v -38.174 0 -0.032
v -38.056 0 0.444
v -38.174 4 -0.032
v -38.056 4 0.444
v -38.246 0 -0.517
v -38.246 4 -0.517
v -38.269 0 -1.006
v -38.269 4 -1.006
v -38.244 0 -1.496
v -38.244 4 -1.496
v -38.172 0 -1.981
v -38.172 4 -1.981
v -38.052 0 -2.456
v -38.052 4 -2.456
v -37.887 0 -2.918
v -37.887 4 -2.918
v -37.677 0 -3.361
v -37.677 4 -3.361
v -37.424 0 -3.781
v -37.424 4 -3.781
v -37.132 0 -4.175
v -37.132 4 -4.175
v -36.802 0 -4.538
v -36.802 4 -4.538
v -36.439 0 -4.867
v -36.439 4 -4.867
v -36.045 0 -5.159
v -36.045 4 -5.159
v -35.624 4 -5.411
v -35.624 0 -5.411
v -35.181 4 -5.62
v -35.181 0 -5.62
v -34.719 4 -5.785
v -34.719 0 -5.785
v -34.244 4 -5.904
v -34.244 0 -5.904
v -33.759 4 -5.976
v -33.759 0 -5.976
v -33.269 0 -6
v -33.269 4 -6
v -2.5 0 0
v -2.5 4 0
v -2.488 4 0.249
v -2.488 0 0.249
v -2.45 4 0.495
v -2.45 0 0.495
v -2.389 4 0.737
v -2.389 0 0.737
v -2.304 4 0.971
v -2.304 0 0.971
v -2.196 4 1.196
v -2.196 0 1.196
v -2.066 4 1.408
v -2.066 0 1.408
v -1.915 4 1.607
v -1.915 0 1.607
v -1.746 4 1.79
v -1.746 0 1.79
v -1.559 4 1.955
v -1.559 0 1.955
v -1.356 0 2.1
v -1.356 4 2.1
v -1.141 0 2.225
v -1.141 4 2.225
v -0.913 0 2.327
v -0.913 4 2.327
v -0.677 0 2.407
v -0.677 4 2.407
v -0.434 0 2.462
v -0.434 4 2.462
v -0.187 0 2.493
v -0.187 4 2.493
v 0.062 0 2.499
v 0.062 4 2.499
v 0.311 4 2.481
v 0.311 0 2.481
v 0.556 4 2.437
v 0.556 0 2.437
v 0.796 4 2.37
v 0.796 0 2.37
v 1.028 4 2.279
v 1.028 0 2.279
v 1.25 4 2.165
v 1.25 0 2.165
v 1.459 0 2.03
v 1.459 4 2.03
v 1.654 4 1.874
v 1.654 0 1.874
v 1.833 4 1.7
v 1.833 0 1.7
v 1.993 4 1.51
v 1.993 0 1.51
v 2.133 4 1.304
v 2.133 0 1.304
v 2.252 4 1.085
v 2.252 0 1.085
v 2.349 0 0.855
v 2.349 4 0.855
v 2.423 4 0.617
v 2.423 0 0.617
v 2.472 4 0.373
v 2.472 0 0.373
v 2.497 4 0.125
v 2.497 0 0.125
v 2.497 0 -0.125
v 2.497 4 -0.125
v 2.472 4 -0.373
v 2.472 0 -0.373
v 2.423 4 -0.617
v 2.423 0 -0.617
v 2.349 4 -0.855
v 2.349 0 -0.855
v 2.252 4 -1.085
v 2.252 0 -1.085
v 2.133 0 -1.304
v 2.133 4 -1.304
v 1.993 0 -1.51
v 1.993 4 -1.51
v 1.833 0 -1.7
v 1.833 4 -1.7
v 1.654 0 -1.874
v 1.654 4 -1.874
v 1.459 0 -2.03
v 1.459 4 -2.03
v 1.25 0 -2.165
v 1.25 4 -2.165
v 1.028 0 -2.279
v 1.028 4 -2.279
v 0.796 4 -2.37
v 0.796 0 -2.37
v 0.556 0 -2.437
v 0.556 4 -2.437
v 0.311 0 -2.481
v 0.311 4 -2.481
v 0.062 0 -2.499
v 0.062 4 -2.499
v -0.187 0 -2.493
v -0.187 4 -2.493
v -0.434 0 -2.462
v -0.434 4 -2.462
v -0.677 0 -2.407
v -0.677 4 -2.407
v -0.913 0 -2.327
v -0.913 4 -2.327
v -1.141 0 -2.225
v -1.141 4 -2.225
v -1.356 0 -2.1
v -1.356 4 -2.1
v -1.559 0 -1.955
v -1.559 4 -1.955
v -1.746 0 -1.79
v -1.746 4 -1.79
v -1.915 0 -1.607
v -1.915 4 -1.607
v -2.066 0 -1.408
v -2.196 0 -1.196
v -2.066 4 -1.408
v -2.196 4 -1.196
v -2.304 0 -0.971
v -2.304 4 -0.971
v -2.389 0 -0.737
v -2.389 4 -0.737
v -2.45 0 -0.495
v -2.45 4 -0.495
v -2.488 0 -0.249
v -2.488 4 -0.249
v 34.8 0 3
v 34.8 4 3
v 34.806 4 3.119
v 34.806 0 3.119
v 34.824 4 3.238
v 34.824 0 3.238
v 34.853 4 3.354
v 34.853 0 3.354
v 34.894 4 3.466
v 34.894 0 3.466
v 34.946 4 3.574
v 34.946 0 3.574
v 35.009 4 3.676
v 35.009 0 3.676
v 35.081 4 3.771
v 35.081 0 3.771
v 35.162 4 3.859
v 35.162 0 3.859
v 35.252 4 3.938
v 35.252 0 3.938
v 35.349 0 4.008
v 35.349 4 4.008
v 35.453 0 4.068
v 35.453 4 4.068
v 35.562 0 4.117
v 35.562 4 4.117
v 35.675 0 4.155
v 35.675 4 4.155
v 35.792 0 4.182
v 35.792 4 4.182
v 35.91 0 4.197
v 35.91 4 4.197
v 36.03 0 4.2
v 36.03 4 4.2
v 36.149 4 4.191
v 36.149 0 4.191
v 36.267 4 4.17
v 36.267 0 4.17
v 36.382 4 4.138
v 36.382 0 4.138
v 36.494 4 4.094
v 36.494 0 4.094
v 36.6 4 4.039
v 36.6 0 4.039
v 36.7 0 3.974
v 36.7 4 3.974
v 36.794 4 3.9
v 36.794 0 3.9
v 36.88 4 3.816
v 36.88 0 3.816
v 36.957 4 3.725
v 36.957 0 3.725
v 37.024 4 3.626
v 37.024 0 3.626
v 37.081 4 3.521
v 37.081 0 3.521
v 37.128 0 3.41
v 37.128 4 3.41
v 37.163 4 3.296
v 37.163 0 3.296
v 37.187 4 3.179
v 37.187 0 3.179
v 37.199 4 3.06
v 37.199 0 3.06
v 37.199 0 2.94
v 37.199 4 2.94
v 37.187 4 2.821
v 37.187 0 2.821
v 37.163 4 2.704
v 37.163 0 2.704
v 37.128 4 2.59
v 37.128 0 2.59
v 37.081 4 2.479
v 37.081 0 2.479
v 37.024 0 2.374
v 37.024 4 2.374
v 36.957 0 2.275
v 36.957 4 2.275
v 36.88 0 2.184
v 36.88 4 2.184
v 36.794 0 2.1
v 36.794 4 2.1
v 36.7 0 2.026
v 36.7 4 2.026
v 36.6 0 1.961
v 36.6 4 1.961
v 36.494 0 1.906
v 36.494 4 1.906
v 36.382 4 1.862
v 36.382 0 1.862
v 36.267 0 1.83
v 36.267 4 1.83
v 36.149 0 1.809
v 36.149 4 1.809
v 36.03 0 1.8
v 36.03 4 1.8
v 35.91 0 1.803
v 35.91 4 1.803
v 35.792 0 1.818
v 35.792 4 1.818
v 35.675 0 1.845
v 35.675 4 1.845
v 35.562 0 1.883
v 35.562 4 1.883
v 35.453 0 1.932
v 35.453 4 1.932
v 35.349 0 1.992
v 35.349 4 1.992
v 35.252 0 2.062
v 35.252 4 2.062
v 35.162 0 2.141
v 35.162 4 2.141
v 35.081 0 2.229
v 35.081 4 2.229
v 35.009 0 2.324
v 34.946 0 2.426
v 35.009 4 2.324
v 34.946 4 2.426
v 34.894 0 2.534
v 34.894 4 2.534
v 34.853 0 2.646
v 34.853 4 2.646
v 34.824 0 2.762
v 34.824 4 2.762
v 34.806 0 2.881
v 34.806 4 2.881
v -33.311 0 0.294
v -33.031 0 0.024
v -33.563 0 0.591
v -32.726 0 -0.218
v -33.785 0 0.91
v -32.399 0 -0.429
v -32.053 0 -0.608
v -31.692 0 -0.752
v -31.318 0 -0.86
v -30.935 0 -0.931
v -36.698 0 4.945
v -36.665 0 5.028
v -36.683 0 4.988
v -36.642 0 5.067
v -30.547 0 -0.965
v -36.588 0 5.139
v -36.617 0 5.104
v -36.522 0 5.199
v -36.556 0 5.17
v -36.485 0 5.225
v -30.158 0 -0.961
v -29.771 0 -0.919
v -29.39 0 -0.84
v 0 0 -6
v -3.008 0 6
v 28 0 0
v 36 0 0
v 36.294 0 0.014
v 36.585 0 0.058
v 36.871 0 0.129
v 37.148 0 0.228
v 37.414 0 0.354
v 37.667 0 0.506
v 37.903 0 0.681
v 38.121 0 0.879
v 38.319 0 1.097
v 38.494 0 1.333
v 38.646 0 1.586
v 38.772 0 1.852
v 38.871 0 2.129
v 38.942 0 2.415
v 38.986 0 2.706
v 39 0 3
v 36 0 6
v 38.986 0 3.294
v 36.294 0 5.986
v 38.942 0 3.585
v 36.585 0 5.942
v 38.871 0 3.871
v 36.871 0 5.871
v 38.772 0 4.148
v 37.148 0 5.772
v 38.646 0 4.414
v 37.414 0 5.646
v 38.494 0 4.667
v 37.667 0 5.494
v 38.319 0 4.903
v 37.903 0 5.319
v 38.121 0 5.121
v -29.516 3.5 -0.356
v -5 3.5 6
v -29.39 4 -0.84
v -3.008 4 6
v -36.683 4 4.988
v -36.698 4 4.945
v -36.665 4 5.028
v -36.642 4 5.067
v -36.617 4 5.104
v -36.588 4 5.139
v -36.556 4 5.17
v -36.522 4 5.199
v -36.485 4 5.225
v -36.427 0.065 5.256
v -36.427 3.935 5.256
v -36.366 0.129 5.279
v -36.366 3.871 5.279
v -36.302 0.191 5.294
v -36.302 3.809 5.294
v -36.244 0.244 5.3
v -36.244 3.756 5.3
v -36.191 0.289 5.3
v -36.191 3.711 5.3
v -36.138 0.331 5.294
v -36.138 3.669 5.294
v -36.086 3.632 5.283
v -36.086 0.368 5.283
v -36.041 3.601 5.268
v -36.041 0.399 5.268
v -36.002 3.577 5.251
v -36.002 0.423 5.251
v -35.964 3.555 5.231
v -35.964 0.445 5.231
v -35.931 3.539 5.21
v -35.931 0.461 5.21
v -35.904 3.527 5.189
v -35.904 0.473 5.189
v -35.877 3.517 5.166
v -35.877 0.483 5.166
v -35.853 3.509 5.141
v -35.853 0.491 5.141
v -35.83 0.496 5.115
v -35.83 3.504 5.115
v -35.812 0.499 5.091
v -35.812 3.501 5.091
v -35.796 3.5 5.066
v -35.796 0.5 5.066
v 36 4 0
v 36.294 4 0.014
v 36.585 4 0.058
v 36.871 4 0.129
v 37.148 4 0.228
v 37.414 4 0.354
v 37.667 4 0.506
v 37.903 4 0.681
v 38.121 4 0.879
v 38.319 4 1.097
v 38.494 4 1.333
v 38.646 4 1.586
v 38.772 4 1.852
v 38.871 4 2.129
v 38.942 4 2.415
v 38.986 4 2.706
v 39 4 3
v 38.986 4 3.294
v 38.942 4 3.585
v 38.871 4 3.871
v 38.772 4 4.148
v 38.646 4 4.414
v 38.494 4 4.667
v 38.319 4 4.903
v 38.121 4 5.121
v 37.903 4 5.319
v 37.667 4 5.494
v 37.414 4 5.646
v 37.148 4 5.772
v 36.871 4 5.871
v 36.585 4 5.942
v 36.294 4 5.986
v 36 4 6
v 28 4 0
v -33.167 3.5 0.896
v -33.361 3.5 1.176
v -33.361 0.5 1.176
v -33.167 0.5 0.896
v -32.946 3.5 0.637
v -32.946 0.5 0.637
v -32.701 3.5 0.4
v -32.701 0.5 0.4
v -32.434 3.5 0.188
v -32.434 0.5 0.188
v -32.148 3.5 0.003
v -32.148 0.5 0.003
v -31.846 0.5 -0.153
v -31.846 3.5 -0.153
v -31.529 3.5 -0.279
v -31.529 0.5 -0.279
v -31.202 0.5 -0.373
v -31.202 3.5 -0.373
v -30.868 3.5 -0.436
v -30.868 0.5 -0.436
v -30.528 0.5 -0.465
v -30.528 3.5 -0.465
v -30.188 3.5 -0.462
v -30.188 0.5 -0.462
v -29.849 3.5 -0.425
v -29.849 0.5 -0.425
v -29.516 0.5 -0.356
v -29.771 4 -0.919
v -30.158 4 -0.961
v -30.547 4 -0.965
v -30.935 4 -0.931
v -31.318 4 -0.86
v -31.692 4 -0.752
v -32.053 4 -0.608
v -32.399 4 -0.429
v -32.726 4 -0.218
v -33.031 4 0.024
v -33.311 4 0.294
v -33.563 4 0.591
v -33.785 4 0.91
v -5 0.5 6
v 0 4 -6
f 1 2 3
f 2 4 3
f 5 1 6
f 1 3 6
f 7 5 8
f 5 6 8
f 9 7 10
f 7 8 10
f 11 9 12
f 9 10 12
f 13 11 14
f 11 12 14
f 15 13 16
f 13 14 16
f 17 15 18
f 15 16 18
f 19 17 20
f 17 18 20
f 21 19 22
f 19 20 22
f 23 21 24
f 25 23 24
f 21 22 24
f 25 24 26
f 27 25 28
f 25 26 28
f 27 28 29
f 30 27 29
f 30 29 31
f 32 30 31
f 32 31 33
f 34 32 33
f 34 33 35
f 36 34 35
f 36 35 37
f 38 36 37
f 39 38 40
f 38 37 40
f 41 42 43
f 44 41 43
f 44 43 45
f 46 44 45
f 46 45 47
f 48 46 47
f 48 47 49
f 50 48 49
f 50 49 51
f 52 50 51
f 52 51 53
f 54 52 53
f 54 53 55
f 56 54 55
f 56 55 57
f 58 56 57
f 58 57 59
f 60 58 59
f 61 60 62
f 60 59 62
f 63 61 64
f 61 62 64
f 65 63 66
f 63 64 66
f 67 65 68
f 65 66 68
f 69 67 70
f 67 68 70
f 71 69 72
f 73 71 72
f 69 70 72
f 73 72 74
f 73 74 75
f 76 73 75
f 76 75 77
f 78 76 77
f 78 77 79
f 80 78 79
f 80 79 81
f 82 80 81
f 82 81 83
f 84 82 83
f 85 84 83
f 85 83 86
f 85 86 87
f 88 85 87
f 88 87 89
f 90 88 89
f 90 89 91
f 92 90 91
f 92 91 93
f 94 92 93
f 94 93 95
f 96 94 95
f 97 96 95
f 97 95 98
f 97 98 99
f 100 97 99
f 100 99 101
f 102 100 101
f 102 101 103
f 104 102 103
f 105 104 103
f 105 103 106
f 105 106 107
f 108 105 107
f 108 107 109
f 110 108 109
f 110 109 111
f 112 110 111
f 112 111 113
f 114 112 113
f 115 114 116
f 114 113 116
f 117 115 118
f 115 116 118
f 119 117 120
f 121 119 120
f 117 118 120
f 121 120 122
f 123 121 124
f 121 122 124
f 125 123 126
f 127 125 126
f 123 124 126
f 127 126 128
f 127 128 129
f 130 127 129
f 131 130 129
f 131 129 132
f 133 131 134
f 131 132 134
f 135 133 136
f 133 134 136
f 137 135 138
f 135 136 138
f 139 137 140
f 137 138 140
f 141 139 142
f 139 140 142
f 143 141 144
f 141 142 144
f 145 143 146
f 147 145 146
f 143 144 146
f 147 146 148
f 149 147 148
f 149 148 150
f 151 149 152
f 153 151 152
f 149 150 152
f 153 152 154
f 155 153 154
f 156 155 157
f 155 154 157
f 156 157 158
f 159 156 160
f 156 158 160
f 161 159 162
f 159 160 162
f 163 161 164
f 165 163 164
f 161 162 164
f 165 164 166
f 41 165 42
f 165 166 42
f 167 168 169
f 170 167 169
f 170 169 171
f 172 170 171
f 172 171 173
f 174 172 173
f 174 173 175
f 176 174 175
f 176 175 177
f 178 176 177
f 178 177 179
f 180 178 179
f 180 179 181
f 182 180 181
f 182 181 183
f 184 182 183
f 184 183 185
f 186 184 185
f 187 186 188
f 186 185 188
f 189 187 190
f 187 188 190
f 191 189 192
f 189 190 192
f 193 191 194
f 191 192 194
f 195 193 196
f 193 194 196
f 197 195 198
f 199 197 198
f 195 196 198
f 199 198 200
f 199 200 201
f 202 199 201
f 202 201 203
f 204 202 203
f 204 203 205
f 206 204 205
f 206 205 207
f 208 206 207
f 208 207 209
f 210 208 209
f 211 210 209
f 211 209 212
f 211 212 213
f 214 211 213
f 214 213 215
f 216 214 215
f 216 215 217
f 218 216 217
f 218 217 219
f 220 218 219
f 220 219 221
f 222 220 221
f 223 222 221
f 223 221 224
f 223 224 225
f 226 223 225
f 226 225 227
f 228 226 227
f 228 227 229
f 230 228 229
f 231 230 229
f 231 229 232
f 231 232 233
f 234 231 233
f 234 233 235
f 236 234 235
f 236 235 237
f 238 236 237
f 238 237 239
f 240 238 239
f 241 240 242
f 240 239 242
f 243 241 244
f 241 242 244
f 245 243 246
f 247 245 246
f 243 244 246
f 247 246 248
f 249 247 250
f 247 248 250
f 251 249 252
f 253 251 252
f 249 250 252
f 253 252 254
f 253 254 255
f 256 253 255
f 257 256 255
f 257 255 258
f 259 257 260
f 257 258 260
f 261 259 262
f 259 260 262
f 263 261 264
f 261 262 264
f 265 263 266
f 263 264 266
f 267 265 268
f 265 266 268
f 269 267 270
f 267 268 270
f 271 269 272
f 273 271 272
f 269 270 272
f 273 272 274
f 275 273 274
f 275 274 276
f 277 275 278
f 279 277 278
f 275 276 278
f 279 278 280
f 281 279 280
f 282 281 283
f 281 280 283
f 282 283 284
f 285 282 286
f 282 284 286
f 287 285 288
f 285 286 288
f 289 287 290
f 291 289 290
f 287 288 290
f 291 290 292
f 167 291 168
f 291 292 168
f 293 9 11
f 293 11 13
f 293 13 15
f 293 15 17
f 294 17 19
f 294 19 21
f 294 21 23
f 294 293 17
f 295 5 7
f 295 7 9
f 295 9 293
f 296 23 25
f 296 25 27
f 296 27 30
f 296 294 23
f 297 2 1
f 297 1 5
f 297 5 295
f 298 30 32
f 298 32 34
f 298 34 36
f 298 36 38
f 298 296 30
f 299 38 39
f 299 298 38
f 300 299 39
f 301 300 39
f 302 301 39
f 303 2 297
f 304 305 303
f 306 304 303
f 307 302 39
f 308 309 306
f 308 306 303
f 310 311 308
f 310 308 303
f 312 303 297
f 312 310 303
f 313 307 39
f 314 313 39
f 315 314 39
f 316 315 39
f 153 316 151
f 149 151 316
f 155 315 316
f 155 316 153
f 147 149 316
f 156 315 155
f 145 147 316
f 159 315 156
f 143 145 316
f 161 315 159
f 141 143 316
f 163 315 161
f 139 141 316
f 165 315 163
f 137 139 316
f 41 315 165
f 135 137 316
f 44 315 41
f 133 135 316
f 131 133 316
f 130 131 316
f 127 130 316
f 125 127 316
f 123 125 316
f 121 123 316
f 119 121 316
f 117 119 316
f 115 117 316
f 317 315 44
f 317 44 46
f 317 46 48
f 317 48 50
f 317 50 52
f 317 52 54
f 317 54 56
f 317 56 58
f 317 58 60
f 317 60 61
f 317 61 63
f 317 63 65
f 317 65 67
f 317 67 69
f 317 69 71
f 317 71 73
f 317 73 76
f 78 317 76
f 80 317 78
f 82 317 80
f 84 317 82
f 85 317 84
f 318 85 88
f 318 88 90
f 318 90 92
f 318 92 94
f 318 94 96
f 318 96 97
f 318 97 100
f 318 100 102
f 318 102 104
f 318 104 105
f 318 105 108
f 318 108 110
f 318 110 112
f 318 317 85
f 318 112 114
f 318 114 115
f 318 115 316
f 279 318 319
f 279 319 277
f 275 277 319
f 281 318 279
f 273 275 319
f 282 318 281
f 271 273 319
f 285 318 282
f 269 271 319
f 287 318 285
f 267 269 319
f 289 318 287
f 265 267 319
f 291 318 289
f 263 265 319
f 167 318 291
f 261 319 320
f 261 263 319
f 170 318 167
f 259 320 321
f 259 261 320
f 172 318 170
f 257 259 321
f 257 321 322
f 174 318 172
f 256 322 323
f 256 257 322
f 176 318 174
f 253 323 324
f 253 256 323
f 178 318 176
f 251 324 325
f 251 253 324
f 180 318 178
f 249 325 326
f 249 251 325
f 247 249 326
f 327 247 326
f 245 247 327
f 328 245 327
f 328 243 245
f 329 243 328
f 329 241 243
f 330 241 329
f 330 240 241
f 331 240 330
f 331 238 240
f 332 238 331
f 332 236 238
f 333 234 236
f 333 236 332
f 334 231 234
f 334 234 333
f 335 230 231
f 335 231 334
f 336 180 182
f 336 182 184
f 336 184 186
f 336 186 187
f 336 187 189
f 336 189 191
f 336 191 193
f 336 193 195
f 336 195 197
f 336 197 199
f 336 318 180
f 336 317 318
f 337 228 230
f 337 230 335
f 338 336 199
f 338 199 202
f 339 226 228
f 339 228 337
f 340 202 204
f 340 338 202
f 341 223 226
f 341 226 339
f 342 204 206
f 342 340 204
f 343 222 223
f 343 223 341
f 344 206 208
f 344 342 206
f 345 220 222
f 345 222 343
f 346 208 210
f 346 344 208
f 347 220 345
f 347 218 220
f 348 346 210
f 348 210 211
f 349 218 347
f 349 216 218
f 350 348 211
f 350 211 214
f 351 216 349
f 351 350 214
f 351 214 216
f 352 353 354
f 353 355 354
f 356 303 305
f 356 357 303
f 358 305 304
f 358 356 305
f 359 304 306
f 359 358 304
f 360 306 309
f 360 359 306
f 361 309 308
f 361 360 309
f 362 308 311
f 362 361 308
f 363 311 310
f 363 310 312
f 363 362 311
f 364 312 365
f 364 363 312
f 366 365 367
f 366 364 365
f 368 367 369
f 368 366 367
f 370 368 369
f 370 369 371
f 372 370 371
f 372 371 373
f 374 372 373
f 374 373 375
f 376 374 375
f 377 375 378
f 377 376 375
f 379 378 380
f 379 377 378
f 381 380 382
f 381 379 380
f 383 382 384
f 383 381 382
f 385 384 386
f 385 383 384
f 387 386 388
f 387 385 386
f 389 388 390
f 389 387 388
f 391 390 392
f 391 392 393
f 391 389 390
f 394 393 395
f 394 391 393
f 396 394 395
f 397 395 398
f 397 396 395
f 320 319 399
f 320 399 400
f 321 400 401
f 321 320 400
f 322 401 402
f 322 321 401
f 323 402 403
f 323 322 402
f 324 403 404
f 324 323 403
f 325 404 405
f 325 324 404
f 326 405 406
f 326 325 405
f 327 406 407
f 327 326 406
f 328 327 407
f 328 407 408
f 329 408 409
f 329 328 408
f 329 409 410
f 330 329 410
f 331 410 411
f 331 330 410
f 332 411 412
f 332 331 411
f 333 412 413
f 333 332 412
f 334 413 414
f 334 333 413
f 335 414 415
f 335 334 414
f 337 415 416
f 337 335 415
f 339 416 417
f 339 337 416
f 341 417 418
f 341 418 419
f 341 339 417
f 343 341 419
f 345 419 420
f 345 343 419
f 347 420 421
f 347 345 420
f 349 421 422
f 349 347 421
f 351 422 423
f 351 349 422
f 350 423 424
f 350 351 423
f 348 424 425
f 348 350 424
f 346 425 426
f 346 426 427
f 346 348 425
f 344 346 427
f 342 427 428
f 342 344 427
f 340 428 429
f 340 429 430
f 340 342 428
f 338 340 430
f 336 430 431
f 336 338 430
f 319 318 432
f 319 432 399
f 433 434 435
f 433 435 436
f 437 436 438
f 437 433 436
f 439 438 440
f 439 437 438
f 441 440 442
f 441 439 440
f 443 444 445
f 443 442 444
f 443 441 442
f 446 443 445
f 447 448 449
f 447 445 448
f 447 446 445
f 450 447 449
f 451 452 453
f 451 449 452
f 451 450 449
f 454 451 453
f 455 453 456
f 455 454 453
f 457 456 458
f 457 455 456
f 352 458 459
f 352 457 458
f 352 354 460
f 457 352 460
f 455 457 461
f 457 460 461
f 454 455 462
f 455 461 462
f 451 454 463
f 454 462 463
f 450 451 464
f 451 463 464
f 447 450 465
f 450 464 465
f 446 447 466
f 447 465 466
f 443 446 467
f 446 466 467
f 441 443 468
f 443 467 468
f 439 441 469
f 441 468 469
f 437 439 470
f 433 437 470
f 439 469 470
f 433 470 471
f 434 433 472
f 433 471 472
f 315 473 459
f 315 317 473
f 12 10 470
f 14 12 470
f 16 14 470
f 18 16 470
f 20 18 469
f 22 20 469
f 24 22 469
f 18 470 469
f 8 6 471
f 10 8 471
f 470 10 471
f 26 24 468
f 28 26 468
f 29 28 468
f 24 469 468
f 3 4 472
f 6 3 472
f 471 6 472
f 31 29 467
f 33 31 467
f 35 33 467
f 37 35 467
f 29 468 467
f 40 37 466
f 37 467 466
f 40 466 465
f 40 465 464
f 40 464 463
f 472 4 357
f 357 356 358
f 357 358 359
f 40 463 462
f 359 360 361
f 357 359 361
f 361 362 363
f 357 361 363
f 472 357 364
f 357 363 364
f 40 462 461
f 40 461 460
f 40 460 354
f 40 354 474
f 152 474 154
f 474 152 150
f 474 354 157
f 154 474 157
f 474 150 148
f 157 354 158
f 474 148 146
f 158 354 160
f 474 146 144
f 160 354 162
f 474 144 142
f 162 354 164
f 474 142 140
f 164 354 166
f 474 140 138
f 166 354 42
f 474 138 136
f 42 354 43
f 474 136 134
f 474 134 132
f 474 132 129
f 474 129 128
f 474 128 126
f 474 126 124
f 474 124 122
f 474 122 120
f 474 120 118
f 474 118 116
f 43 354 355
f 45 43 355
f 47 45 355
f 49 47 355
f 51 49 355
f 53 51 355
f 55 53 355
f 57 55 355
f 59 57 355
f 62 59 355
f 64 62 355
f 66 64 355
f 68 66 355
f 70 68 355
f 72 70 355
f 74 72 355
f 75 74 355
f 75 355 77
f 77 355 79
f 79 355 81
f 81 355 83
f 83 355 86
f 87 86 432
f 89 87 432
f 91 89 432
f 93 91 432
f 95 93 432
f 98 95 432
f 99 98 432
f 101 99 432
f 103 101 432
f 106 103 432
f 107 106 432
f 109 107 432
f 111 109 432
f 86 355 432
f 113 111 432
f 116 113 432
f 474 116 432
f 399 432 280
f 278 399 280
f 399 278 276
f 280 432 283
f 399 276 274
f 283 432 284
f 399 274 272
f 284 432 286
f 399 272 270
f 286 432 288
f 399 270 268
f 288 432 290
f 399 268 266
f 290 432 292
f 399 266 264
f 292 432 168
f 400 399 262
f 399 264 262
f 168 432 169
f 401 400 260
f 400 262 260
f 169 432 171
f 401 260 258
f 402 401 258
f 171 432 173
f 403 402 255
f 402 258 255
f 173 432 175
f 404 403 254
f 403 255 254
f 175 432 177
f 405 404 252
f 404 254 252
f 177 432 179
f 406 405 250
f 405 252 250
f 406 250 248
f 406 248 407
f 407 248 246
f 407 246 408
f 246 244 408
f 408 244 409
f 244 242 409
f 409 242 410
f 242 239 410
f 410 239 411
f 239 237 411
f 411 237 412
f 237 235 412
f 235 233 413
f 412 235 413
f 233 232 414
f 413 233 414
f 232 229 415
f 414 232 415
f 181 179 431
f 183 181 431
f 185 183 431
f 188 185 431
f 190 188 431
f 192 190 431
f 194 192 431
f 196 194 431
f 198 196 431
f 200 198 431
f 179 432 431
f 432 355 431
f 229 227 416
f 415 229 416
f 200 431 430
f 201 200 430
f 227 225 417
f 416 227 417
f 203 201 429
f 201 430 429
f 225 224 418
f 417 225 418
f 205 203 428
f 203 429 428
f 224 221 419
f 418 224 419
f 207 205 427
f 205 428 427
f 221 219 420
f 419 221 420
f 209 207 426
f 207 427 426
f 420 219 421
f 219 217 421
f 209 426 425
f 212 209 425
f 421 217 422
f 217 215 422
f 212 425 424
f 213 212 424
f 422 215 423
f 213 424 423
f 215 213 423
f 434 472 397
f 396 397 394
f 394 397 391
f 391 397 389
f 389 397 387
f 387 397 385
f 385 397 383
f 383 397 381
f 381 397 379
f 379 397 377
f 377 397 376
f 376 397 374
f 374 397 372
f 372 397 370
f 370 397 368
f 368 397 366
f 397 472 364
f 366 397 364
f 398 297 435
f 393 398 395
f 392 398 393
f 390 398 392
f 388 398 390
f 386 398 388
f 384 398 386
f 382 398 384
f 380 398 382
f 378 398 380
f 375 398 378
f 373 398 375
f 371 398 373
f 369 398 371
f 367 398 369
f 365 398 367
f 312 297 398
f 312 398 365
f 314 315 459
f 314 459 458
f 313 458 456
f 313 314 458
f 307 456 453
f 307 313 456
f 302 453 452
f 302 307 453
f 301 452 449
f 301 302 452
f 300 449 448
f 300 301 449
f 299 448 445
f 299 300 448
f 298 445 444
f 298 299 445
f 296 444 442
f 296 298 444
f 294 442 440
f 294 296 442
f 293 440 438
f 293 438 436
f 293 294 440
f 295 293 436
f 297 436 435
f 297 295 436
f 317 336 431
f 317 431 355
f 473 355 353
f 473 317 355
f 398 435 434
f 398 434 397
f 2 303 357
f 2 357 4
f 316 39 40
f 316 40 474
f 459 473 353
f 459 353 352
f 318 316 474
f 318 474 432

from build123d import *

# Parameters (mm, degrees)
F1_DEPTH = 4
F2_D     = 5
F3_R     = 3.5
F4_D     = 2.4
F5_SIZE  = 0.5
F6_R     = 5
F7_R     = 0.5


with BuildPart() as f1:
    # F0 (on Front) → F1 (new body)
    with BuildSketch(Plane.XZ):
        with BuildLine():
            Line((-36.3799407881, 6), (-40, -6))
            Line((-40, -6), (0, -6))
            Line((0, -6), (28, 0))
            Line((28, 0), (36, 0))
            ThreePointArc((36, 0), (39, 3), (36, 6))
            Line((36, 6), (-5, 6))
            Line((-5, 6), (-32, -1))
            Line((-32, -1), (-36.3799407881, 6))
        make_face()
    extrude(amount=-F1_DEPTH)

    # F2 (through all)
    with Locations(Plane.XZ):
        with Locations((0, 0)):
            Hole(F2_D / 2)

    # F3
    f3_edges = [f1.edges().sort_by_distance(p)[0] for p in [
        (-32, 2, -1),
    ]]
    fillet(f3_edges, radius=F3_R)

    # F4 (through all)
    with Locations(Plane.XZ):
        with Locations((36, 3)):
            Hole(F4_D / 2)

    # F5
    f5_edges = [f1.edges().sort_by_distance(p)[0] for p in [
        (-34.870592, 0, 3.587766),
        (-34.870592, 4, 3.587766),
    ]]
    chamfer(f5_edges, length=F5_SIZE)

    # F6
    f6_edges = [f1.edges().sort_by_distance(p)[0] for p in [
        (-40, 2, -6),
    ]]
    fillet(f6_edges, radius=F6_R)

    # F7
    f7_edges = [f1.edges().sort_by_distance(p)[0] for p in [
        (-36.379941, 2, 6),
    ]]
    fillet(f7_edges, radius=F7_R)


solid = f1.part
